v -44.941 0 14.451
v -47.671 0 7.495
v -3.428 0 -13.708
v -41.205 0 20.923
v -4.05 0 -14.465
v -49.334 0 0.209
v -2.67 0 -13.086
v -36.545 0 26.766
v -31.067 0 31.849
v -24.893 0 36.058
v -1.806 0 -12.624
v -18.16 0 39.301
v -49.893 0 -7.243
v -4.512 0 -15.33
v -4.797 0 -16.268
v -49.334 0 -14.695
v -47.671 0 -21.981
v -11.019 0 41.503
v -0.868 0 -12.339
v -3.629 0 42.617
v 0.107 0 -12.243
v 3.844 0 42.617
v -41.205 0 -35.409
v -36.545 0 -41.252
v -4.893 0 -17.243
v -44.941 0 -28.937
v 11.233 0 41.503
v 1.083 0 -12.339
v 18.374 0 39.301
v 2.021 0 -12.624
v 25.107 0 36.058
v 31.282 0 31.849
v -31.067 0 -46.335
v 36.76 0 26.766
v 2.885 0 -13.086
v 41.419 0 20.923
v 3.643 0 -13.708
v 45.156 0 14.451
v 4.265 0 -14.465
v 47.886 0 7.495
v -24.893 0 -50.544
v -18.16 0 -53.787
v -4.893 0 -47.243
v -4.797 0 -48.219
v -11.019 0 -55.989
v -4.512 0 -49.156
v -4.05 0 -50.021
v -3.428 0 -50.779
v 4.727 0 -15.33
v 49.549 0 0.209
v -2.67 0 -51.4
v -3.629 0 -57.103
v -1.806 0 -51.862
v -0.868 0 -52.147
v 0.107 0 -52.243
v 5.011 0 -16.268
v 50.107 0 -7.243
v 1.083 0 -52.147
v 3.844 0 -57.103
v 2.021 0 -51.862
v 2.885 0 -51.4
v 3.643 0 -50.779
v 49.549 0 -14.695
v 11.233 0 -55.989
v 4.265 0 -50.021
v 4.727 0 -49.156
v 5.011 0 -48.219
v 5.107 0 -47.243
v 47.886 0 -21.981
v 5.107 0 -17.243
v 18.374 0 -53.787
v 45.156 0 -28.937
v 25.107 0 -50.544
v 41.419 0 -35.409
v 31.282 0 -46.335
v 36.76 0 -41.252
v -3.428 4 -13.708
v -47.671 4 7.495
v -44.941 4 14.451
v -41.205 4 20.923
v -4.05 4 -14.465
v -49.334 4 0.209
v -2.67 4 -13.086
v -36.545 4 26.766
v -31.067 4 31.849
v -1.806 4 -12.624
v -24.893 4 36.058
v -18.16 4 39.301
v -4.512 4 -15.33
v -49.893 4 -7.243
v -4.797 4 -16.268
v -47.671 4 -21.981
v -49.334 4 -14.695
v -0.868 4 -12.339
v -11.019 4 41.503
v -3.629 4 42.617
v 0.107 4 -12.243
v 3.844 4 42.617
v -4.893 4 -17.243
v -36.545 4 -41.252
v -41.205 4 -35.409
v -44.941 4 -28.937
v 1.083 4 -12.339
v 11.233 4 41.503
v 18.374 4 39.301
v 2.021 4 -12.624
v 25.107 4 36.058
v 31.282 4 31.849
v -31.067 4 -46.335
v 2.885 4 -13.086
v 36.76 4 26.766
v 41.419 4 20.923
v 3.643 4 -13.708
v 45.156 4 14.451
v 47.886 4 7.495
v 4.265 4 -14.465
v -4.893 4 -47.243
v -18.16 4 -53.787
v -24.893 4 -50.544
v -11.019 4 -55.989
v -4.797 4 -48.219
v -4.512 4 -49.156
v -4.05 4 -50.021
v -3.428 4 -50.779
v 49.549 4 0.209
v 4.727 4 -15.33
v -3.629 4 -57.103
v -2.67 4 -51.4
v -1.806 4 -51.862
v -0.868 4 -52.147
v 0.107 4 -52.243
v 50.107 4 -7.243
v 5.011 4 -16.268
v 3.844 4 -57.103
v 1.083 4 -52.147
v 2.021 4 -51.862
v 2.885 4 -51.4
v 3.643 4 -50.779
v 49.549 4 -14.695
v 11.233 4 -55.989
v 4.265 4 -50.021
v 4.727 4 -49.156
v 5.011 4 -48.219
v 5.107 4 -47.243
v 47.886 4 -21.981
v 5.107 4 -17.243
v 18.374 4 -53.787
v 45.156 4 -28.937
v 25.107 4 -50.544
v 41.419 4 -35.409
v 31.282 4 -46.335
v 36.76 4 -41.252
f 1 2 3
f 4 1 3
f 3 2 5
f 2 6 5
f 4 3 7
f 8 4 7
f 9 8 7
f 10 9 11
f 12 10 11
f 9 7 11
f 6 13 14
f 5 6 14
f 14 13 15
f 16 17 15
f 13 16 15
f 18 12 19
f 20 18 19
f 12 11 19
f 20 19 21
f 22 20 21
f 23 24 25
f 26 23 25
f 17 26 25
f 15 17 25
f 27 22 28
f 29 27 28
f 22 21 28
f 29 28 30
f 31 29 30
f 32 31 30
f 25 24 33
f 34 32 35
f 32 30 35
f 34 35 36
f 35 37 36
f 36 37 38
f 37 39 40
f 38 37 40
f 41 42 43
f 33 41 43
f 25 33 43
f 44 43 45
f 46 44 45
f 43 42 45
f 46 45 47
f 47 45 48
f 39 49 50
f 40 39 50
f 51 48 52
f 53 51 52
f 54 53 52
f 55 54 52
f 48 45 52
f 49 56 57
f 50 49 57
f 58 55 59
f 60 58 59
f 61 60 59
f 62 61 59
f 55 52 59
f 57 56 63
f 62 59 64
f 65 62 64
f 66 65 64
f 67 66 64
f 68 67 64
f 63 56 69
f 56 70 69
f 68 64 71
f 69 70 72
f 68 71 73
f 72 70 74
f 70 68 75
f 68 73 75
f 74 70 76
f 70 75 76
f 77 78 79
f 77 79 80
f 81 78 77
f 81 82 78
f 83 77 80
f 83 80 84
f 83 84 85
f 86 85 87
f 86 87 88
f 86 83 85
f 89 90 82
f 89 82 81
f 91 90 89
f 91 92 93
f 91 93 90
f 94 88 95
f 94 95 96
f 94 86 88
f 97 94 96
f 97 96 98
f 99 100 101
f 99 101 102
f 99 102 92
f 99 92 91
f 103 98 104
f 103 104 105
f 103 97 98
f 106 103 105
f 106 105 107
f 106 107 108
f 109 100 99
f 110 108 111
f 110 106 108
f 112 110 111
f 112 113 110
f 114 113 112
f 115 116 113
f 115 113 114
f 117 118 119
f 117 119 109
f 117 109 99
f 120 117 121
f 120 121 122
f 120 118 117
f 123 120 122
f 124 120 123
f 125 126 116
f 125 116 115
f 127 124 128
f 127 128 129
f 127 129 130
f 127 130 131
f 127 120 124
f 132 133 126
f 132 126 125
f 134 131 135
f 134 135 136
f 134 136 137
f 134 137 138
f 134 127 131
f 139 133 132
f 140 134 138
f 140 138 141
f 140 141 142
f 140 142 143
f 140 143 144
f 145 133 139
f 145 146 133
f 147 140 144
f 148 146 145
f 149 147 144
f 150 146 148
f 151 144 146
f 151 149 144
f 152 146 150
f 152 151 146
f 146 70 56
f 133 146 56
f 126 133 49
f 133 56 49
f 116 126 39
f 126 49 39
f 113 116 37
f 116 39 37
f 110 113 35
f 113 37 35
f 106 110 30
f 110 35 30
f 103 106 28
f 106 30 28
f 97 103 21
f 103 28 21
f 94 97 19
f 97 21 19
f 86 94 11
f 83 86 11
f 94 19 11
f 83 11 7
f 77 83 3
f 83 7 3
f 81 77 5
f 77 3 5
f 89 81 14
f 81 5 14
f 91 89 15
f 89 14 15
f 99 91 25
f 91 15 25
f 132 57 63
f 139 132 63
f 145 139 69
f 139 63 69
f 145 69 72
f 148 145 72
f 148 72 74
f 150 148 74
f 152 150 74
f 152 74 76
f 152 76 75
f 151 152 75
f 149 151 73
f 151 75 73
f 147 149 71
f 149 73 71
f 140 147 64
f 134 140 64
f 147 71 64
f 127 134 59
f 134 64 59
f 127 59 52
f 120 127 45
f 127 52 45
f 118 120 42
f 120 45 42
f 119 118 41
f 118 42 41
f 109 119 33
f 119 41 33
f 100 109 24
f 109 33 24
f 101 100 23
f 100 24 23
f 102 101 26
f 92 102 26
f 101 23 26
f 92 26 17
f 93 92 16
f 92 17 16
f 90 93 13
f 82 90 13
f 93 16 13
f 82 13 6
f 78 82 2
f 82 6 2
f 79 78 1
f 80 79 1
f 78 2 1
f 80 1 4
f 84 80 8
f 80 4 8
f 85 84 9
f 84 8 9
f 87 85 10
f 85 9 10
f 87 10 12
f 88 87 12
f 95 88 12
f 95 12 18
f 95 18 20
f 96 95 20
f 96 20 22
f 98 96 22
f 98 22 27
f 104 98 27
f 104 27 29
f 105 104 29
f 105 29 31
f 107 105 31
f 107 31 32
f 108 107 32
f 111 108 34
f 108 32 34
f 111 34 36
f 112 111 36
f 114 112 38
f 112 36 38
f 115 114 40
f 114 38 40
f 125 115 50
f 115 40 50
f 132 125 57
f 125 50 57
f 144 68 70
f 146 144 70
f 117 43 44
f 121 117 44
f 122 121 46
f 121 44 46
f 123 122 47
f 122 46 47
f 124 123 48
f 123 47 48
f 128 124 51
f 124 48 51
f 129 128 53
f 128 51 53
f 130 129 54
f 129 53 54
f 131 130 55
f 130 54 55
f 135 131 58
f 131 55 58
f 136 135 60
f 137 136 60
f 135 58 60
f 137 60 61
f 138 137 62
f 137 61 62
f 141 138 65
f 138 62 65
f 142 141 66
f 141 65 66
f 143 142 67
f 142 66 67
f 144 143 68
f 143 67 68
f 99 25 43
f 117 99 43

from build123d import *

# Parameters (mm, degrees)
SKETCH1_R           = 50
BOSS_EXTRUDE1_DEPTH = 4


with BuildPart() as part:
    # Sketch1 → Boss-Extrude1 (new body)
    with BuildSketch(Plane(origin=(0, 0, 0), x_dir=(1, 0, 0), z_dir=(0, 1, 0))):
        with Locations((0.107420937, 7.243062526)):
            Circle(SKETCH1_R)
        with BuildLine():
            Line((-4.892579063, 17.243062526), (-4.892579063, 47.243062526))
            ThreePointArc((-4.892579063, 47.243062526), (0.107420937, 52.243062526), (5.107420937, 47.243062526))
            Line((5.107420937, 47.243062526), (5.107420937, 17.243062526))
            ThreePointArc((5.107420937, 17.243062526), (0.107420937, 12.243062526), (-4.892579063, 17.243062526))
        make_face(mode=Mode.SUBTRACT)
    extrude(amount=BOSS_EXTRUDE1_DEPTH)


solid = part.part
